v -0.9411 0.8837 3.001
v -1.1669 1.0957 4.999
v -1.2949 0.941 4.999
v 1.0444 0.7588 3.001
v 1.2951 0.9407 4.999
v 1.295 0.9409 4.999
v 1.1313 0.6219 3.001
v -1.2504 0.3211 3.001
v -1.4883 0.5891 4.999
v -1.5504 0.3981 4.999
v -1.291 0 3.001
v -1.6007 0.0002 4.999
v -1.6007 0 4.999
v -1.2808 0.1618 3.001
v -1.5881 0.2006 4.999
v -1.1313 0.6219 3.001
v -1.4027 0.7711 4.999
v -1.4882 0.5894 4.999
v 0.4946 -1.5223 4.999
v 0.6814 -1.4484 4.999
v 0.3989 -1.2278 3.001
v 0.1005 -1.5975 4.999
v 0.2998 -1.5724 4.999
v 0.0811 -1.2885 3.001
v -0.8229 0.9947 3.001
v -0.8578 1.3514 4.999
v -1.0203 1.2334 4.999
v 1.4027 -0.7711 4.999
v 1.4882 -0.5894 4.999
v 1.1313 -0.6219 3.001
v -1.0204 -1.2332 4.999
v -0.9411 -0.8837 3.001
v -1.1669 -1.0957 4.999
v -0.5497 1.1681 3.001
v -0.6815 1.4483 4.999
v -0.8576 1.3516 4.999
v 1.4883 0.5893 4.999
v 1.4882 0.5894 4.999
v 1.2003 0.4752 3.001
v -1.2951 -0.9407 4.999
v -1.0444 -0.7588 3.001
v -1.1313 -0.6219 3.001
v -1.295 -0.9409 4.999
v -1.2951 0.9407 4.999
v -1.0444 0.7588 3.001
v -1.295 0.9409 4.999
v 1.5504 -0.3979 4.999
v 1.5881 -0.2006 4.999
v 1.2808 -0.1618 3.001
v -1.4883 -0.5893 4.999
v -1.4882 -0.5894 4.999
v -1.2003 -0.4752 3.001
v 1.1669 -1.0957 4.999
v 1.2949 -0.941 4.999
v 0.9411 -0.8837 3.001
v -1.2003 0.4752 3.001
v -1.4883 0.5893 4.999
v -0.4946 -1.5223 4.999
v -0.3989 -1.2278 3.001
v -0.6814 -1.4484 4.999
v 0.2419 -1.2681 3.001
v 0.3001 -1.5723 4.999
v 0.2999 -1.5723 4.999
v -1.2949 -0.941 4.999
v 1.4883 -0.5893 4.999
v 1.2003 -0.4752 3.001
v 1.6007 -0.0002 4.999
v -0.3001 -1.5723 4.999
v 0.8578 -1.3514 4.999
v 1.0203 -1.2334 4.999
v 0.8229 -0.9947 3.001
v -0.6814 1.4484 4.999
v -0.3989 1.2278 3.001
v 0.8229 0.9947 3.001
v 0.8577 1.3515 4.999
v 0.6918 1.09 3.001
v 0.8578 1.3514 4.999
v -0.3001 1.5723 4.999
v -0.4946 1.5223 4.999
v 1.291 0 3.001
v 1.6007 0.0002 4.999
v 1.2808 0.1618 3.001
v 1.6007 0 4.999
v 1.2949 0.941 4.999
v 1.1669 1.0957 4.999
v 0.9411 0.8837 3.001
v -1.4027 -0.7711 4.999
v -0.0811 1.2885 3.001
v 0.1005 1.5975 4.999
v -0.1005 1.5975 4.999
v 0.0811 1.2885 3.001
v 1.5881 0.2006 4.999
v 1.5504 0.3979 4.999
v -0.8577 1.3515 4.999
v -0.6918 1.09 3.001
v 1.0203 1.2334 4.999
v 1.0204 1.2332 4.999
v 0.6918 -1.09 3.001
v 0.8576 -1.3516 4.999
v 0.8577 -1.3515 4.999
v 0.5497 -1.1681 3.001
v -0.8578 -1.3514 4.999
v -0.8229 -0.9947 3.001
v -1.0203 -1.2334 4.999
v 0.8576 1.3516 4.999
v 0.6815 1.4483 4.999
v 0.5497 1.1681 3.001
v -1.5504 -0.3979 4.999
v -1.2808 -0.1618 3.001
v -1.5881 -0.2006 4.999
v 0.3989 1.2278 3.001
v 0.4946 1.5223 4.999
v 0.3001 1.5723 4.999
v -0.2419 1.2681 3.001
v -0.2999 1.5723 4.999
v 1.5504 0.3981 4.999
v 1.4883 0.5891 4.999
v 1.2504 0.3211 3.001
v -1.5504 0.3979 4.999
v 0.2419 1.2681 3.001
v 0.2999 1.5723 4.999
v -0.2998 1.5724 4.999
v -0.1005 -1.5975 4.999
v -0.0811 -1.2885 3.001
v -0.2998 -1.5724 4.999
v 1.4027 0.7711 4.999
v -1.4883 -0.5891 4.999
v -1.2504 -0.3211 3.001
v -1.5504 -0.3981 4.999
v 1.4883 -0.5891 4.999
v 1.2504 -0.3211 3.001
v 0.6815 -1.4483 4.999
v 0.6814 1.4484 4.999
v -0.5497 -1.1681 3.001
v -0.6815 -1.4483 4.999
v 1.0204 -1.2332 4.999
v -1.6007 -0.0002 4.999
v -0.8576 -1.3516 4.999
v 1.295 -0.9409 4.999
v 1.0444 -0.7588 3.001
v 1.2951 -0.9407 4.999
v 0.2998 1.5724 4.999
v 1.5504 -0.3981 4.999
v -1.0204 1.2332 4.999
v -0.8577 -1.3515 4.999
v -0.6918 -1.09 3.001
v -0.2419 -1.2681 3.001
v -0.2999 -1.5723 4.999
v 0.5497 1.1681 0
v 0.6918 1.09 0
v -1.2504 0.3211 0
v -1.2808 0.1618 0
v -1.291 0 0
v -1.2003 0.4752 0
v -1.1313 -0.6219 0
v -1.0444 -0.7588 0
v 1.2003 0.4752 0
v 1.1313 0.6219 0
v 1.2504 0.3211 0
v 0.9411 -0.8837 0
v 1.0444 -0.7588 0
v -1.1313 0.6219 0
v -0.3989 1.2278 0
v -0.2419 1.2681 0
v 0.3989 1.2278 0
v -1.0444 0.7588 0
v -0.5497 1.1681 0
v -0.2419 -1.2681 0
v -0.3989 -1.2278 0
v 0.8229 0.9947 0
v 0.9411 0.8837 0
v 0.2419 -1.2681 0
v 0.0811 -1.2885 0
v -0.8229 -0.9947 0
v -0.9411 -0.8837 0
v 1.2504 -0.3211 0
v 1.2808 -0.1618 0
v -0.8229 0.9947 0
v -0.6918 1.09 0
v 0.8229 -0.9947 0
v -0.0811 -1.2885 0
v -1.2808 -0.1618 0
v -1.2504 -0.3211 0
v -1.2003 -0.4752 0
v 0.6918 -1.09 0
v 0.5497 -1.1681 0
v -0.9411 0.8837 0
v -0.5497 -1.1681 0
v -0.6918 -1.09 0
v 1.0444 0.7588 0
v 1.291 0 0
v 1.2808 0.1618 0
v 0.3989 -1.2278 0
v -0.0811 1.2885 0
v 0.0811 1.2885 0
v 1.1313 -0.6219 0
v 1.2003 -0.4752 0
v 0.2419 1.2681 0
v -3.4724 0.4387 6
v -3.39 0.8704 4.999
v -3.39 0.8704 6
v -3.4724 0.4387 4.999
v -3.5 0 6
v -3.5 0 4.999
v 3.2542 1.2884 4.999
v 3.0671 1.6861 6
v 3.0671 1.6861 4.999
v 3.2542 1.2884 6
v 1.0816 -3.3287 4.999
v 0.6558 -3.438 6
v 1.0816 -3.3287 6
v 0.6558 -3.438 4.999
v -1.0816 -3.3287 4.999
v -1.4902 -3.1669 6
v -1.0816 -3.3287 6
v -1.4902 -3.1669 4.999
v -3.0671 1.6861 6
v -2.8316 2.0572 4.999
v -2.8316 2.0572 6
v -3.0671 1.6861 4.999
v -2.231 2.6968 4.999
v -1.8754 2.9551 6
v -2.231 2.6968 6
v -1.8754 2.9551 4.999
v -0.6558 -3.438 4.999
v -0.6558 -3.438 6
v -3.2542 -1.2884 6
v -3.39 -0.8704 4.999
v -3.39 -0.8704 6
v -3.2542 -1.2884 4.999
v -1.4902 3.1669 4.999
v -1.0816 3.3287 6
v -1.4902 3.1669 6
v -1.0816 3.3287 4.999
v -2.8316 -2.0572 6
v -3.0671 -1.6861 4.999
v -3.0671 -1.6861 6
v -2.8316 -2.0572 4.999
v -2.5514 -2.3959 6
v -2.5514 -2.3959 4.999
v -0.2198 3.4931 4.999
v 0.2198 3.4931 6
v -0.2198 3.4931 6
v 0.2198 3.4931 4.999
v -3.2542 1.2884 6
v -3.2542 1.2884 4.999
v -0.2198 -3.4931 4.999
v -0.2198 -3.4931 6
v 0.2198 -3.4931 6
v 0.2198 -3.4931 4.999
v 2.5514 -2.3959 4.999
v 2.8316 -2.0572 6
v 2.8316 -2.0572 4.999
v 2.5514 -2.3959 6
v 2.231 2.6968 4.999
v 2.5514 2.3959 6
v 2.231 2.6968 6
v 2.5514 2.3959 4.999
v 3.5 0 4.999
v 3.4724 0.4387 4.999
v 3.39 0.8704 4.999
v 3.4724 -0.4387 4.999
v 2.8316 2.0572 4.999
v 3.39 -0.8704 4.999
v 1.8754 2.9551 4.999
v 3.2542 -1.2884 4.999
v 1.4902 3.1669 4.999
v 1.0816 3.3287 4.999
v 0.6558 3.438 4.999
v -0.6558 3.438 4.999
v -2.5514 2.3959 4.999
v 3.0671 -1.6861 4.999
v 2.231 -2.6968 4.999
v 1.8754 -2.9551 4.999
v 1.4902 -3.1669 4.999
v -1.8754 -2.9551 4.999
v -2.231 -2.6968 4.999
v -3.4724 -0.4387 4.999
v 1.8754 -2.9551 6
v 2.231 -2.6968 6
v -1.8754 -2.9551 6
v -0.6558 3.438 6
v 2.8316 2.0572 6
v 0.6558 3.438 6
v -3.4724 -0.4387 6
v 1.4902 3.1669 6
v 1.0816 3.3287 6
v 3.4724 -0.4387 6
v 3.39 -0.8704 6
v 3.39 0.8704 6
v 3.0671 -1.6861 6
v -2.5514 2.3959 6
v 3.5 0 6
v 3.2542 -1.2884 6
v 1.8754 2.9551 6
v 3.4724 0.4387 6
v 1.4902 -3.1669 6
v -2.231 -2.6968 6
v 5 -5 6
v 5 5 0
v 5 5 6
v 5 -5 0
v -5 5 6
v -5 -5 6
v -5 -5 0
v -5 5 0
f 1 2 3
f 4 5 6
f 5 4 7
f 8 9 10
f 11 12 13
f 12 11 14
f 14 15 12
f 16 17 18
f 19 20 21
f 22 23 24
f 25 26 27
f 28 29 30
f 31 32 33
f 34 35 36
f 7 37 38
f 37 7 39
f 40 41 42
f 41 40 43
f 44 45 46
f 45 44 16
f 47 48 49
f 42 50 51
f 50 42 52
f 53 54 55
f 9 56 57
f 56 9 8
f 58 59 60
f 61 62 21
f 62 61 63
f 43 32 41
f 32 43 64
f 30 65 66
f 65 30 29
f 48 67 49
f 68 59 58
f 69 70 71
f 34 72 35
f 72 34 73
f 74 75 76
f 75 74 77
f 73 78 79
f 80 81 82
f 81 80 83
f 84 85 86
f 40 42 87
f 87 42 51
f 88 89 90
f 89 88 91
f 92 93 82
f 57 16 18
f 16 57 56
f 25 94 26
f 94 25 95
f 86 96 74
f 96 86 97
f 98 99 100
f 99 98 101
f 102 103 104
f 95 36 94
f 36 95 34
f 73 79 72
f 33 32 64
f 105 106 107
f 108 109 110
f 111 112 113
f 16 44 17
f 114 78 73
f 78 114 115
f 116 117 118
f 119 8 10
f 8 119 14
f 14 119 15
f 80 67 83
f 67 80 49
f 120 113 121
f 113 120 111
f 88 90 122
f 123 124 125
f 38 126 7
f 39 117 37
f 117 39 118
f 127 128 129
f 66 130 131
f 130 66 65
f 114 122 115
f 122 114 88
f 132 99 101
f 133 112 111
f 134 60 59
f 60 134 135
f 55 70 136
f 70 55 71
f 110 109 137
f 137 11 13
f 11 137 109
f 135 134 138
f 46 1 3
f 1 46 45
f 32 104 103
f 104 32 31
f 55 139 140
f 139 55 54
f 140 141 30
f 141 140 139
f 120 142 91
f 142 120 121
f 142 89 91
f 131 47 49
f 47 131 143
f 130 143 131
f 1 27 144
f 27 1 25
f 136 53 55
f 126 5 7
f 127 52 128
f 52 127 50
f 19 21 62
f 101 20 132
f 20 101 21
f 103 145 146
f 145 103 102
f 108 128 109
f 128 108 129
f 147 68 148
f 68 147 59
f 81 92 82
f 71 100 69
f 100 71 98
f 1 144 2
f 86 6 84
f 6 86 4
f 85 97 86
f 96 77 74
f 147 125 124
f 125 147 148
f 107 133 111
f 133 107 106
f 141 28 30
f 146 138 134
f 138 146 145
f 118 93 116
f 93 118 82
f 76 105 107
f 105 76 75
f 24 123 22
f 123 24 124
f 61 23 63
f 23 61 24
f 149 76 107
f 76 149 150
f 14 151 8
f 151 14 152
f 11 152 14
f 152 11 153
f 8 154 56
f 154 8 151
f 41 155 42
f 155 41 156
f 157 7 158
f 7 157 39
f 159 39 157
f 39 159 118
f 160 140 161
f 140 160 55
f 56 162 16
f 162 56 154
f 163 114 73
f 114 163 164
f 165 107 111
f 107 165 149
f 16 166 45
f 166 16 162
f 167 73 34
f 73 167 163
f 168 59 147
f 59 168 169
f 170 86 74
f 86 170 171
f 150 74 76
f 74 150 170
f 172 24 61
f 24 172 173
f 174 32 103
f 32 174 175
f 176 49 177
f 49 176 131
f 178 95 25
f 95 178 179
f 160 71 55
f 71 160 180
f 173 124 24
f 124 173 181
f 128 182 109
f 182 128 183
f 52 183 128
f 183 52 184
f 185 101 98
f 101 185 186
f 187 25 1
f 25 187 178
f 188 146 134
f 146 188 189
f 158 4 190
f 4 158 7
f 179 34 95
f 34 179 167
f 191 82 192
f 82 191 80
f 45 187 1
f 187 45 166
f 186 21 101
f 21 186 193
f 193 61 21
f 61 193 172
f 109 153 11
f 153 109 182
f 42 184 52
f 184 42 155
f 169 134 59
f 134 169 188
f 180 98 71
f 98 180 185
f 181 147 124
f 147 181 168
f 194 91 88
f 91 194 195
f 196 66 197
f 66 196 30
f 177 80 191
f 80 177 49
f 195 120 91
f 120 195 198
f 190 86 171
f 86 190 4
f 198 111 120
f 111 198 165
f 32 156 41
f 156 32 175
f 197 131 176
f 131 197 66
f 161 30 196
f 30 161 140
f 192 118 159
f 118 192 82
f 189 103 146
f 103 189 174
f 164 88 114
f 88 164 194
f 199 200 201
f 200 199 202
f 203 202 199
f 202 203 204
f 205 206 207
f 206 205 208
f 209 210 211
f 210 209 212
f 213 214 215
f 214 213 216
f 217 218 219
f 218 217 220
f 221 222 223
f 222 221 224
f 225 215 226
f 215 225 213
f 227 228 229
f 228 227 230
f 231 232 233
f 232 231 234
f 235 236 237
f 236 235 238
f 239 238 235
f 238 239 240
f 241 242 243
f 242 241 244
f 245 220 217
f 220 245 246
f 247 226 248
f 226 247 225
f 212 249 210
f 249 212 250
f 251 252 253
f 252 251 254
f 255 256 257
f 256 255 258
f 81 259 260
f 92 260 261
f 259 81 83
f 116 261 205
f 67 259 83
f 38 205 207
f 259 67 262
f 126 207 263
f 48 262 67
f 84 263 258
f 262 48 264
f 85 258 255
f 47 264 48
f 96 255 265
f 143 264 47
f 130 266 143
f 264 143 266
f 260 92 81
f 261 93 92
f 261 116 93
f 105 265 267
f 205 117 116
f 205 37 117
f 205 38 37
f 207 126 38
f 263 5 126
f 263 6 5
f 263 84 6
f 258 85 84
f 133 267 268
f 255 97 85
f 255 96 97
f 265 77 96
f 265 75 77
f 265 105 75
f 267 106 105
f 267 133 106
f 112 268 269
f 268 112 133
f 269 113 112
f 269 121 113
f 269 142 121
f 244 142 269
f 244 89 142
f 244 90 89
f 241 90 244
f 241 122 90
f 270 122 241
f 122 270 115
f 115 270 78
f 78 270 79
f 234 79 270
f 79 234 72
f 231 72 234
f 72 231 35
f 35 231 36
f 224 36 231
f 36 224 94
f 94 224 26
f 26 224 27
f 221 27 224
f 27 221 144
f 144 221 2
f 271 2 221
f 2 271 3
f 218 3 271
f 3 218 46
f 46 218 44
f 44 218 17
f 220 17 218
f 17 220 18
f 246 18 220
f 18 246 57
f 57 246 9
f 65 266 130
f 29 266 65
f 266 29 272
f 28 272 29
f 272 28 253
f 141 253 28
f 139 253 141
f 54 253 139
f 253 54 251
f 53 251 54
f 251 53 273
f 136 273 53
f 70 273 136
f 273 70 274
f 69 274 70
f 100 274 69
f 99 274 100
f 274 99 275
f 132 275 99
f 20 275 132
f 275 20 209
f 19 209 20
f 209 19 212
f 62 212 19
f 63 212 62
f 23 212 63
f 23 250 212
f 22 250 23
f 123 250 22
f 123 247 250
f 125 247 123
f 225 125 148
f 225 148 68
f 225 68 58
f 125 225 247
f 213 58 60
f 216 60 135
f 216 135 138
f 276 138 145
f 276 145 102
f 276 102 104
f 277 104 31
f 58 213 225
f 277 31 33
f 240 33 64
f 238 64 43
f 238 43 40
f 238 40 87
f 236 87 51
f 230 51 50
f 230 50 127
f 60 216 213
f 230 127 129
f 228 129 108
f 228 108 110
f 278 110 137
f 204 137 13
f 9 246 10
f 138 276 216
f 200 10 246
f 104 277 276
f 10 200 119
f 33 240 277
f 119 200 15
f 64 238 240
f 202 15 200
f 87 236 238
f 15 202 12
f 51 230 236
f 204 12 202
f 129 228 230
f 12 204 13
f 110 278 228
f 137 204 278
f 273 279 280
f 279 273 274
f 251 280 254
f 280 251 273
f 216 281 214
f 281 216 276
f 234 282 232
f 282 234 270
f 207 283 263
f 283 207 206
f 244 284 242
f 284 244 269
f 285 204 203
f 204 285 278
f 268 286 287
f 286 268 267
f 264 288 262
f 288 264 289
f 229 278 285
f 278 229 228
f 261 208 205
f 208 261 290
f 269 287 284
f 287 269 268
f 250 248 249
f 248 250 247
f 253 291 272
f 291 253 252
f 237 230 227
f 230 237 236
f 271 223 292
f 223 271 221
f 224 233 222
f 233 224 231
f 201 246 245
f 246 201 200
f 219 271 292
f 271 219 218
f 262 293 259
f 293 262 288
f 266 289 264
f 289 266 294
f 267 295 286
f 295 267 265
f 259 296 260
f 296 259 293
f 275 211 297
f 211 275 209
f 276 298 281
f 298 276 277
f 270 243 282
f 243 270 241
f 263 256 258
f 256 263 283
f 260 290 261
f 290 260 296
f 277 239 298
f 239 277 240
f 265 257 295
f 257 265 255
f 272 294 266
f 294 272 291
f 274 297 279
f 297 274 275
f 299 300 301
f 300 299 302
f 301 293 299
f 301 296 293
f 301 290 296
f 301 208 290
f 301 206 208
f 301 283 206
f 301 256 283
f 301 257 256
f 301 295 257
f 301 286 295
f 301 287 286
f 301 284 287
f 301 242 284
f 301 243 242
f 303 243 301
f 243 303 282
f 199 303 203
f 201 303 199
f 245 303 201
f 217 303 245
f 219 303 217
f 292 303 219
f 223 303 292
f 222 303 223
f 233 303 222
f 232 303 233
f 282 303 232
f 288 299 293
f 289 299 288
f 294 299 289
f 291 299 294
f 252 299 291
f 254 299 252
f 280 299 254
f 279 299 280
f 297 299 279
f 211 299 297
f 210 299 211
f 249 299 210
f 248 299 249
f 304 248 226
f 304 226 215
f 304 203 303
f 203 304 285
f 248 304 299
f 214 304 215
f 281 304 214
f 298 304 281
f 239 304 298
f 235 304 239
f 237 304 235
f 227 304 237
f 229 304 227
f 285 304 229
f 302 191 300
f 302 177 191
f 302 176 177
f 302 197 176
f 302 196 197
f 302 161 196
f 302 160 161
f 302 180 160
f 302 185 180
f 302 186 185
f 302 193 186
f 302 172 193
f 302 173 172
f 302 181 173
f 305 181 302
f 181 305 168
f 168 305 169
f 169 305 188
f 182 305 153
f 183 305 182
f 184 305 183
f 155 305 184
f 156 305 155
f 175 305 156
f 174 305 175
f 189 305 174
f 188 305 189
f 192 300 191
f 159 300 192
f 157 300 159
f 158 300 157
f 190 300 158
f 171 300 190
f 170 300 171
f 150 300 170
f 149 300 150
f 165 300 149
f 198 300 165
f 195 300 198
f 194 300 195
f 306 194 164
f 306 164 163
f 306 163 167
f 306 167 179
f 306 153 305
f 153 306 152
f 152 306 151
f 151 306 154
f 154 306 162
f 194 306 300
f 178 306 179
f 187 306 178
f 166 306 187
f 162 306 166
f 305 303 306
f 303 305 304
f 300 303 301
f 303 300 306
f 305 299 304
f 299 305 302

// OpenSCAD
// Some screw stuff

module screw(top_r=2, top_h=1, thread_r=0.5, thread_h=4) {
    // Handle passing all params as array
    if(is_list(top_r) && len(top_r) >= 4) {
        screw(top_r[0], top_r[1], top_r[2], top_r[3]);
    } else {
        assert(is_num(top_r) && is_num(top_h) && is_num(thread_r) && is_num(thread_h), "Incorrect types!");
        // Actual module begins here
        $fn = 50;
        color("DarkGrey"){
            cylinder(h = thread_h, r = thread_r);
            translate([0, 0, -top_h]) difference() {
                cylinder(h = top_h, r = top_r);
                cube([top_r, top_r/4, top_h], center=true);
                cube([top_r/4, top_r, top_h], center=true);
            }
        }
    }
}

module screw_cutout(top_r=2, top_h=1, thread_r=0.5, thread_h=4, chamfer_r=0.5, chamfer_h=0) {
    // Handle passing all params as array
    if(is_list(top_r) && len(top_r) >= 4) {
        screw_cutout(top_r[0], top_r[1], top_r[2], top_r[3], top_r[4] ? top_r[4] : 0, top_r[5] ? top_r[5] : 0);
    } else {
        assert(is_num(top_r) && is_num(top_h) && is_num(thread_r) && is_num(thread_h) && is_num(chamfer_r) && is_num(chamfer_h), "Incorrect types!");
        // Actual module begins here
        $fn = 50;
        translate([0, 0, -0.001]) cylinder(h = chamfer_h, r1 = chamfer_r+0.001, r2 = thread_r+0.001);
        translate([0, 0, -0.001-chamfer_h]) cylinder(h = thread_h*1.1-chamfer_h, r = thread_r+0.001);
        translate([0, 0, -top_h*50+0.001]) cylinder(h = top_h*50, r = 1.25*top_r);
    }
}

// Test measurements
screw_Plasfast = [5.6/2, 2.1, 3/2*0.86, 10, 3/2+0.1, 2];
screw_M3_black = [7/2, 1.6, 1.5, 5];

difference() {
    translate([-5, -5, 0]) cube([10,10,6]);
    translate([0, 0, 5]) rotate([0, 180, 0]) screw_cutout(screw_Plasfast);
}
